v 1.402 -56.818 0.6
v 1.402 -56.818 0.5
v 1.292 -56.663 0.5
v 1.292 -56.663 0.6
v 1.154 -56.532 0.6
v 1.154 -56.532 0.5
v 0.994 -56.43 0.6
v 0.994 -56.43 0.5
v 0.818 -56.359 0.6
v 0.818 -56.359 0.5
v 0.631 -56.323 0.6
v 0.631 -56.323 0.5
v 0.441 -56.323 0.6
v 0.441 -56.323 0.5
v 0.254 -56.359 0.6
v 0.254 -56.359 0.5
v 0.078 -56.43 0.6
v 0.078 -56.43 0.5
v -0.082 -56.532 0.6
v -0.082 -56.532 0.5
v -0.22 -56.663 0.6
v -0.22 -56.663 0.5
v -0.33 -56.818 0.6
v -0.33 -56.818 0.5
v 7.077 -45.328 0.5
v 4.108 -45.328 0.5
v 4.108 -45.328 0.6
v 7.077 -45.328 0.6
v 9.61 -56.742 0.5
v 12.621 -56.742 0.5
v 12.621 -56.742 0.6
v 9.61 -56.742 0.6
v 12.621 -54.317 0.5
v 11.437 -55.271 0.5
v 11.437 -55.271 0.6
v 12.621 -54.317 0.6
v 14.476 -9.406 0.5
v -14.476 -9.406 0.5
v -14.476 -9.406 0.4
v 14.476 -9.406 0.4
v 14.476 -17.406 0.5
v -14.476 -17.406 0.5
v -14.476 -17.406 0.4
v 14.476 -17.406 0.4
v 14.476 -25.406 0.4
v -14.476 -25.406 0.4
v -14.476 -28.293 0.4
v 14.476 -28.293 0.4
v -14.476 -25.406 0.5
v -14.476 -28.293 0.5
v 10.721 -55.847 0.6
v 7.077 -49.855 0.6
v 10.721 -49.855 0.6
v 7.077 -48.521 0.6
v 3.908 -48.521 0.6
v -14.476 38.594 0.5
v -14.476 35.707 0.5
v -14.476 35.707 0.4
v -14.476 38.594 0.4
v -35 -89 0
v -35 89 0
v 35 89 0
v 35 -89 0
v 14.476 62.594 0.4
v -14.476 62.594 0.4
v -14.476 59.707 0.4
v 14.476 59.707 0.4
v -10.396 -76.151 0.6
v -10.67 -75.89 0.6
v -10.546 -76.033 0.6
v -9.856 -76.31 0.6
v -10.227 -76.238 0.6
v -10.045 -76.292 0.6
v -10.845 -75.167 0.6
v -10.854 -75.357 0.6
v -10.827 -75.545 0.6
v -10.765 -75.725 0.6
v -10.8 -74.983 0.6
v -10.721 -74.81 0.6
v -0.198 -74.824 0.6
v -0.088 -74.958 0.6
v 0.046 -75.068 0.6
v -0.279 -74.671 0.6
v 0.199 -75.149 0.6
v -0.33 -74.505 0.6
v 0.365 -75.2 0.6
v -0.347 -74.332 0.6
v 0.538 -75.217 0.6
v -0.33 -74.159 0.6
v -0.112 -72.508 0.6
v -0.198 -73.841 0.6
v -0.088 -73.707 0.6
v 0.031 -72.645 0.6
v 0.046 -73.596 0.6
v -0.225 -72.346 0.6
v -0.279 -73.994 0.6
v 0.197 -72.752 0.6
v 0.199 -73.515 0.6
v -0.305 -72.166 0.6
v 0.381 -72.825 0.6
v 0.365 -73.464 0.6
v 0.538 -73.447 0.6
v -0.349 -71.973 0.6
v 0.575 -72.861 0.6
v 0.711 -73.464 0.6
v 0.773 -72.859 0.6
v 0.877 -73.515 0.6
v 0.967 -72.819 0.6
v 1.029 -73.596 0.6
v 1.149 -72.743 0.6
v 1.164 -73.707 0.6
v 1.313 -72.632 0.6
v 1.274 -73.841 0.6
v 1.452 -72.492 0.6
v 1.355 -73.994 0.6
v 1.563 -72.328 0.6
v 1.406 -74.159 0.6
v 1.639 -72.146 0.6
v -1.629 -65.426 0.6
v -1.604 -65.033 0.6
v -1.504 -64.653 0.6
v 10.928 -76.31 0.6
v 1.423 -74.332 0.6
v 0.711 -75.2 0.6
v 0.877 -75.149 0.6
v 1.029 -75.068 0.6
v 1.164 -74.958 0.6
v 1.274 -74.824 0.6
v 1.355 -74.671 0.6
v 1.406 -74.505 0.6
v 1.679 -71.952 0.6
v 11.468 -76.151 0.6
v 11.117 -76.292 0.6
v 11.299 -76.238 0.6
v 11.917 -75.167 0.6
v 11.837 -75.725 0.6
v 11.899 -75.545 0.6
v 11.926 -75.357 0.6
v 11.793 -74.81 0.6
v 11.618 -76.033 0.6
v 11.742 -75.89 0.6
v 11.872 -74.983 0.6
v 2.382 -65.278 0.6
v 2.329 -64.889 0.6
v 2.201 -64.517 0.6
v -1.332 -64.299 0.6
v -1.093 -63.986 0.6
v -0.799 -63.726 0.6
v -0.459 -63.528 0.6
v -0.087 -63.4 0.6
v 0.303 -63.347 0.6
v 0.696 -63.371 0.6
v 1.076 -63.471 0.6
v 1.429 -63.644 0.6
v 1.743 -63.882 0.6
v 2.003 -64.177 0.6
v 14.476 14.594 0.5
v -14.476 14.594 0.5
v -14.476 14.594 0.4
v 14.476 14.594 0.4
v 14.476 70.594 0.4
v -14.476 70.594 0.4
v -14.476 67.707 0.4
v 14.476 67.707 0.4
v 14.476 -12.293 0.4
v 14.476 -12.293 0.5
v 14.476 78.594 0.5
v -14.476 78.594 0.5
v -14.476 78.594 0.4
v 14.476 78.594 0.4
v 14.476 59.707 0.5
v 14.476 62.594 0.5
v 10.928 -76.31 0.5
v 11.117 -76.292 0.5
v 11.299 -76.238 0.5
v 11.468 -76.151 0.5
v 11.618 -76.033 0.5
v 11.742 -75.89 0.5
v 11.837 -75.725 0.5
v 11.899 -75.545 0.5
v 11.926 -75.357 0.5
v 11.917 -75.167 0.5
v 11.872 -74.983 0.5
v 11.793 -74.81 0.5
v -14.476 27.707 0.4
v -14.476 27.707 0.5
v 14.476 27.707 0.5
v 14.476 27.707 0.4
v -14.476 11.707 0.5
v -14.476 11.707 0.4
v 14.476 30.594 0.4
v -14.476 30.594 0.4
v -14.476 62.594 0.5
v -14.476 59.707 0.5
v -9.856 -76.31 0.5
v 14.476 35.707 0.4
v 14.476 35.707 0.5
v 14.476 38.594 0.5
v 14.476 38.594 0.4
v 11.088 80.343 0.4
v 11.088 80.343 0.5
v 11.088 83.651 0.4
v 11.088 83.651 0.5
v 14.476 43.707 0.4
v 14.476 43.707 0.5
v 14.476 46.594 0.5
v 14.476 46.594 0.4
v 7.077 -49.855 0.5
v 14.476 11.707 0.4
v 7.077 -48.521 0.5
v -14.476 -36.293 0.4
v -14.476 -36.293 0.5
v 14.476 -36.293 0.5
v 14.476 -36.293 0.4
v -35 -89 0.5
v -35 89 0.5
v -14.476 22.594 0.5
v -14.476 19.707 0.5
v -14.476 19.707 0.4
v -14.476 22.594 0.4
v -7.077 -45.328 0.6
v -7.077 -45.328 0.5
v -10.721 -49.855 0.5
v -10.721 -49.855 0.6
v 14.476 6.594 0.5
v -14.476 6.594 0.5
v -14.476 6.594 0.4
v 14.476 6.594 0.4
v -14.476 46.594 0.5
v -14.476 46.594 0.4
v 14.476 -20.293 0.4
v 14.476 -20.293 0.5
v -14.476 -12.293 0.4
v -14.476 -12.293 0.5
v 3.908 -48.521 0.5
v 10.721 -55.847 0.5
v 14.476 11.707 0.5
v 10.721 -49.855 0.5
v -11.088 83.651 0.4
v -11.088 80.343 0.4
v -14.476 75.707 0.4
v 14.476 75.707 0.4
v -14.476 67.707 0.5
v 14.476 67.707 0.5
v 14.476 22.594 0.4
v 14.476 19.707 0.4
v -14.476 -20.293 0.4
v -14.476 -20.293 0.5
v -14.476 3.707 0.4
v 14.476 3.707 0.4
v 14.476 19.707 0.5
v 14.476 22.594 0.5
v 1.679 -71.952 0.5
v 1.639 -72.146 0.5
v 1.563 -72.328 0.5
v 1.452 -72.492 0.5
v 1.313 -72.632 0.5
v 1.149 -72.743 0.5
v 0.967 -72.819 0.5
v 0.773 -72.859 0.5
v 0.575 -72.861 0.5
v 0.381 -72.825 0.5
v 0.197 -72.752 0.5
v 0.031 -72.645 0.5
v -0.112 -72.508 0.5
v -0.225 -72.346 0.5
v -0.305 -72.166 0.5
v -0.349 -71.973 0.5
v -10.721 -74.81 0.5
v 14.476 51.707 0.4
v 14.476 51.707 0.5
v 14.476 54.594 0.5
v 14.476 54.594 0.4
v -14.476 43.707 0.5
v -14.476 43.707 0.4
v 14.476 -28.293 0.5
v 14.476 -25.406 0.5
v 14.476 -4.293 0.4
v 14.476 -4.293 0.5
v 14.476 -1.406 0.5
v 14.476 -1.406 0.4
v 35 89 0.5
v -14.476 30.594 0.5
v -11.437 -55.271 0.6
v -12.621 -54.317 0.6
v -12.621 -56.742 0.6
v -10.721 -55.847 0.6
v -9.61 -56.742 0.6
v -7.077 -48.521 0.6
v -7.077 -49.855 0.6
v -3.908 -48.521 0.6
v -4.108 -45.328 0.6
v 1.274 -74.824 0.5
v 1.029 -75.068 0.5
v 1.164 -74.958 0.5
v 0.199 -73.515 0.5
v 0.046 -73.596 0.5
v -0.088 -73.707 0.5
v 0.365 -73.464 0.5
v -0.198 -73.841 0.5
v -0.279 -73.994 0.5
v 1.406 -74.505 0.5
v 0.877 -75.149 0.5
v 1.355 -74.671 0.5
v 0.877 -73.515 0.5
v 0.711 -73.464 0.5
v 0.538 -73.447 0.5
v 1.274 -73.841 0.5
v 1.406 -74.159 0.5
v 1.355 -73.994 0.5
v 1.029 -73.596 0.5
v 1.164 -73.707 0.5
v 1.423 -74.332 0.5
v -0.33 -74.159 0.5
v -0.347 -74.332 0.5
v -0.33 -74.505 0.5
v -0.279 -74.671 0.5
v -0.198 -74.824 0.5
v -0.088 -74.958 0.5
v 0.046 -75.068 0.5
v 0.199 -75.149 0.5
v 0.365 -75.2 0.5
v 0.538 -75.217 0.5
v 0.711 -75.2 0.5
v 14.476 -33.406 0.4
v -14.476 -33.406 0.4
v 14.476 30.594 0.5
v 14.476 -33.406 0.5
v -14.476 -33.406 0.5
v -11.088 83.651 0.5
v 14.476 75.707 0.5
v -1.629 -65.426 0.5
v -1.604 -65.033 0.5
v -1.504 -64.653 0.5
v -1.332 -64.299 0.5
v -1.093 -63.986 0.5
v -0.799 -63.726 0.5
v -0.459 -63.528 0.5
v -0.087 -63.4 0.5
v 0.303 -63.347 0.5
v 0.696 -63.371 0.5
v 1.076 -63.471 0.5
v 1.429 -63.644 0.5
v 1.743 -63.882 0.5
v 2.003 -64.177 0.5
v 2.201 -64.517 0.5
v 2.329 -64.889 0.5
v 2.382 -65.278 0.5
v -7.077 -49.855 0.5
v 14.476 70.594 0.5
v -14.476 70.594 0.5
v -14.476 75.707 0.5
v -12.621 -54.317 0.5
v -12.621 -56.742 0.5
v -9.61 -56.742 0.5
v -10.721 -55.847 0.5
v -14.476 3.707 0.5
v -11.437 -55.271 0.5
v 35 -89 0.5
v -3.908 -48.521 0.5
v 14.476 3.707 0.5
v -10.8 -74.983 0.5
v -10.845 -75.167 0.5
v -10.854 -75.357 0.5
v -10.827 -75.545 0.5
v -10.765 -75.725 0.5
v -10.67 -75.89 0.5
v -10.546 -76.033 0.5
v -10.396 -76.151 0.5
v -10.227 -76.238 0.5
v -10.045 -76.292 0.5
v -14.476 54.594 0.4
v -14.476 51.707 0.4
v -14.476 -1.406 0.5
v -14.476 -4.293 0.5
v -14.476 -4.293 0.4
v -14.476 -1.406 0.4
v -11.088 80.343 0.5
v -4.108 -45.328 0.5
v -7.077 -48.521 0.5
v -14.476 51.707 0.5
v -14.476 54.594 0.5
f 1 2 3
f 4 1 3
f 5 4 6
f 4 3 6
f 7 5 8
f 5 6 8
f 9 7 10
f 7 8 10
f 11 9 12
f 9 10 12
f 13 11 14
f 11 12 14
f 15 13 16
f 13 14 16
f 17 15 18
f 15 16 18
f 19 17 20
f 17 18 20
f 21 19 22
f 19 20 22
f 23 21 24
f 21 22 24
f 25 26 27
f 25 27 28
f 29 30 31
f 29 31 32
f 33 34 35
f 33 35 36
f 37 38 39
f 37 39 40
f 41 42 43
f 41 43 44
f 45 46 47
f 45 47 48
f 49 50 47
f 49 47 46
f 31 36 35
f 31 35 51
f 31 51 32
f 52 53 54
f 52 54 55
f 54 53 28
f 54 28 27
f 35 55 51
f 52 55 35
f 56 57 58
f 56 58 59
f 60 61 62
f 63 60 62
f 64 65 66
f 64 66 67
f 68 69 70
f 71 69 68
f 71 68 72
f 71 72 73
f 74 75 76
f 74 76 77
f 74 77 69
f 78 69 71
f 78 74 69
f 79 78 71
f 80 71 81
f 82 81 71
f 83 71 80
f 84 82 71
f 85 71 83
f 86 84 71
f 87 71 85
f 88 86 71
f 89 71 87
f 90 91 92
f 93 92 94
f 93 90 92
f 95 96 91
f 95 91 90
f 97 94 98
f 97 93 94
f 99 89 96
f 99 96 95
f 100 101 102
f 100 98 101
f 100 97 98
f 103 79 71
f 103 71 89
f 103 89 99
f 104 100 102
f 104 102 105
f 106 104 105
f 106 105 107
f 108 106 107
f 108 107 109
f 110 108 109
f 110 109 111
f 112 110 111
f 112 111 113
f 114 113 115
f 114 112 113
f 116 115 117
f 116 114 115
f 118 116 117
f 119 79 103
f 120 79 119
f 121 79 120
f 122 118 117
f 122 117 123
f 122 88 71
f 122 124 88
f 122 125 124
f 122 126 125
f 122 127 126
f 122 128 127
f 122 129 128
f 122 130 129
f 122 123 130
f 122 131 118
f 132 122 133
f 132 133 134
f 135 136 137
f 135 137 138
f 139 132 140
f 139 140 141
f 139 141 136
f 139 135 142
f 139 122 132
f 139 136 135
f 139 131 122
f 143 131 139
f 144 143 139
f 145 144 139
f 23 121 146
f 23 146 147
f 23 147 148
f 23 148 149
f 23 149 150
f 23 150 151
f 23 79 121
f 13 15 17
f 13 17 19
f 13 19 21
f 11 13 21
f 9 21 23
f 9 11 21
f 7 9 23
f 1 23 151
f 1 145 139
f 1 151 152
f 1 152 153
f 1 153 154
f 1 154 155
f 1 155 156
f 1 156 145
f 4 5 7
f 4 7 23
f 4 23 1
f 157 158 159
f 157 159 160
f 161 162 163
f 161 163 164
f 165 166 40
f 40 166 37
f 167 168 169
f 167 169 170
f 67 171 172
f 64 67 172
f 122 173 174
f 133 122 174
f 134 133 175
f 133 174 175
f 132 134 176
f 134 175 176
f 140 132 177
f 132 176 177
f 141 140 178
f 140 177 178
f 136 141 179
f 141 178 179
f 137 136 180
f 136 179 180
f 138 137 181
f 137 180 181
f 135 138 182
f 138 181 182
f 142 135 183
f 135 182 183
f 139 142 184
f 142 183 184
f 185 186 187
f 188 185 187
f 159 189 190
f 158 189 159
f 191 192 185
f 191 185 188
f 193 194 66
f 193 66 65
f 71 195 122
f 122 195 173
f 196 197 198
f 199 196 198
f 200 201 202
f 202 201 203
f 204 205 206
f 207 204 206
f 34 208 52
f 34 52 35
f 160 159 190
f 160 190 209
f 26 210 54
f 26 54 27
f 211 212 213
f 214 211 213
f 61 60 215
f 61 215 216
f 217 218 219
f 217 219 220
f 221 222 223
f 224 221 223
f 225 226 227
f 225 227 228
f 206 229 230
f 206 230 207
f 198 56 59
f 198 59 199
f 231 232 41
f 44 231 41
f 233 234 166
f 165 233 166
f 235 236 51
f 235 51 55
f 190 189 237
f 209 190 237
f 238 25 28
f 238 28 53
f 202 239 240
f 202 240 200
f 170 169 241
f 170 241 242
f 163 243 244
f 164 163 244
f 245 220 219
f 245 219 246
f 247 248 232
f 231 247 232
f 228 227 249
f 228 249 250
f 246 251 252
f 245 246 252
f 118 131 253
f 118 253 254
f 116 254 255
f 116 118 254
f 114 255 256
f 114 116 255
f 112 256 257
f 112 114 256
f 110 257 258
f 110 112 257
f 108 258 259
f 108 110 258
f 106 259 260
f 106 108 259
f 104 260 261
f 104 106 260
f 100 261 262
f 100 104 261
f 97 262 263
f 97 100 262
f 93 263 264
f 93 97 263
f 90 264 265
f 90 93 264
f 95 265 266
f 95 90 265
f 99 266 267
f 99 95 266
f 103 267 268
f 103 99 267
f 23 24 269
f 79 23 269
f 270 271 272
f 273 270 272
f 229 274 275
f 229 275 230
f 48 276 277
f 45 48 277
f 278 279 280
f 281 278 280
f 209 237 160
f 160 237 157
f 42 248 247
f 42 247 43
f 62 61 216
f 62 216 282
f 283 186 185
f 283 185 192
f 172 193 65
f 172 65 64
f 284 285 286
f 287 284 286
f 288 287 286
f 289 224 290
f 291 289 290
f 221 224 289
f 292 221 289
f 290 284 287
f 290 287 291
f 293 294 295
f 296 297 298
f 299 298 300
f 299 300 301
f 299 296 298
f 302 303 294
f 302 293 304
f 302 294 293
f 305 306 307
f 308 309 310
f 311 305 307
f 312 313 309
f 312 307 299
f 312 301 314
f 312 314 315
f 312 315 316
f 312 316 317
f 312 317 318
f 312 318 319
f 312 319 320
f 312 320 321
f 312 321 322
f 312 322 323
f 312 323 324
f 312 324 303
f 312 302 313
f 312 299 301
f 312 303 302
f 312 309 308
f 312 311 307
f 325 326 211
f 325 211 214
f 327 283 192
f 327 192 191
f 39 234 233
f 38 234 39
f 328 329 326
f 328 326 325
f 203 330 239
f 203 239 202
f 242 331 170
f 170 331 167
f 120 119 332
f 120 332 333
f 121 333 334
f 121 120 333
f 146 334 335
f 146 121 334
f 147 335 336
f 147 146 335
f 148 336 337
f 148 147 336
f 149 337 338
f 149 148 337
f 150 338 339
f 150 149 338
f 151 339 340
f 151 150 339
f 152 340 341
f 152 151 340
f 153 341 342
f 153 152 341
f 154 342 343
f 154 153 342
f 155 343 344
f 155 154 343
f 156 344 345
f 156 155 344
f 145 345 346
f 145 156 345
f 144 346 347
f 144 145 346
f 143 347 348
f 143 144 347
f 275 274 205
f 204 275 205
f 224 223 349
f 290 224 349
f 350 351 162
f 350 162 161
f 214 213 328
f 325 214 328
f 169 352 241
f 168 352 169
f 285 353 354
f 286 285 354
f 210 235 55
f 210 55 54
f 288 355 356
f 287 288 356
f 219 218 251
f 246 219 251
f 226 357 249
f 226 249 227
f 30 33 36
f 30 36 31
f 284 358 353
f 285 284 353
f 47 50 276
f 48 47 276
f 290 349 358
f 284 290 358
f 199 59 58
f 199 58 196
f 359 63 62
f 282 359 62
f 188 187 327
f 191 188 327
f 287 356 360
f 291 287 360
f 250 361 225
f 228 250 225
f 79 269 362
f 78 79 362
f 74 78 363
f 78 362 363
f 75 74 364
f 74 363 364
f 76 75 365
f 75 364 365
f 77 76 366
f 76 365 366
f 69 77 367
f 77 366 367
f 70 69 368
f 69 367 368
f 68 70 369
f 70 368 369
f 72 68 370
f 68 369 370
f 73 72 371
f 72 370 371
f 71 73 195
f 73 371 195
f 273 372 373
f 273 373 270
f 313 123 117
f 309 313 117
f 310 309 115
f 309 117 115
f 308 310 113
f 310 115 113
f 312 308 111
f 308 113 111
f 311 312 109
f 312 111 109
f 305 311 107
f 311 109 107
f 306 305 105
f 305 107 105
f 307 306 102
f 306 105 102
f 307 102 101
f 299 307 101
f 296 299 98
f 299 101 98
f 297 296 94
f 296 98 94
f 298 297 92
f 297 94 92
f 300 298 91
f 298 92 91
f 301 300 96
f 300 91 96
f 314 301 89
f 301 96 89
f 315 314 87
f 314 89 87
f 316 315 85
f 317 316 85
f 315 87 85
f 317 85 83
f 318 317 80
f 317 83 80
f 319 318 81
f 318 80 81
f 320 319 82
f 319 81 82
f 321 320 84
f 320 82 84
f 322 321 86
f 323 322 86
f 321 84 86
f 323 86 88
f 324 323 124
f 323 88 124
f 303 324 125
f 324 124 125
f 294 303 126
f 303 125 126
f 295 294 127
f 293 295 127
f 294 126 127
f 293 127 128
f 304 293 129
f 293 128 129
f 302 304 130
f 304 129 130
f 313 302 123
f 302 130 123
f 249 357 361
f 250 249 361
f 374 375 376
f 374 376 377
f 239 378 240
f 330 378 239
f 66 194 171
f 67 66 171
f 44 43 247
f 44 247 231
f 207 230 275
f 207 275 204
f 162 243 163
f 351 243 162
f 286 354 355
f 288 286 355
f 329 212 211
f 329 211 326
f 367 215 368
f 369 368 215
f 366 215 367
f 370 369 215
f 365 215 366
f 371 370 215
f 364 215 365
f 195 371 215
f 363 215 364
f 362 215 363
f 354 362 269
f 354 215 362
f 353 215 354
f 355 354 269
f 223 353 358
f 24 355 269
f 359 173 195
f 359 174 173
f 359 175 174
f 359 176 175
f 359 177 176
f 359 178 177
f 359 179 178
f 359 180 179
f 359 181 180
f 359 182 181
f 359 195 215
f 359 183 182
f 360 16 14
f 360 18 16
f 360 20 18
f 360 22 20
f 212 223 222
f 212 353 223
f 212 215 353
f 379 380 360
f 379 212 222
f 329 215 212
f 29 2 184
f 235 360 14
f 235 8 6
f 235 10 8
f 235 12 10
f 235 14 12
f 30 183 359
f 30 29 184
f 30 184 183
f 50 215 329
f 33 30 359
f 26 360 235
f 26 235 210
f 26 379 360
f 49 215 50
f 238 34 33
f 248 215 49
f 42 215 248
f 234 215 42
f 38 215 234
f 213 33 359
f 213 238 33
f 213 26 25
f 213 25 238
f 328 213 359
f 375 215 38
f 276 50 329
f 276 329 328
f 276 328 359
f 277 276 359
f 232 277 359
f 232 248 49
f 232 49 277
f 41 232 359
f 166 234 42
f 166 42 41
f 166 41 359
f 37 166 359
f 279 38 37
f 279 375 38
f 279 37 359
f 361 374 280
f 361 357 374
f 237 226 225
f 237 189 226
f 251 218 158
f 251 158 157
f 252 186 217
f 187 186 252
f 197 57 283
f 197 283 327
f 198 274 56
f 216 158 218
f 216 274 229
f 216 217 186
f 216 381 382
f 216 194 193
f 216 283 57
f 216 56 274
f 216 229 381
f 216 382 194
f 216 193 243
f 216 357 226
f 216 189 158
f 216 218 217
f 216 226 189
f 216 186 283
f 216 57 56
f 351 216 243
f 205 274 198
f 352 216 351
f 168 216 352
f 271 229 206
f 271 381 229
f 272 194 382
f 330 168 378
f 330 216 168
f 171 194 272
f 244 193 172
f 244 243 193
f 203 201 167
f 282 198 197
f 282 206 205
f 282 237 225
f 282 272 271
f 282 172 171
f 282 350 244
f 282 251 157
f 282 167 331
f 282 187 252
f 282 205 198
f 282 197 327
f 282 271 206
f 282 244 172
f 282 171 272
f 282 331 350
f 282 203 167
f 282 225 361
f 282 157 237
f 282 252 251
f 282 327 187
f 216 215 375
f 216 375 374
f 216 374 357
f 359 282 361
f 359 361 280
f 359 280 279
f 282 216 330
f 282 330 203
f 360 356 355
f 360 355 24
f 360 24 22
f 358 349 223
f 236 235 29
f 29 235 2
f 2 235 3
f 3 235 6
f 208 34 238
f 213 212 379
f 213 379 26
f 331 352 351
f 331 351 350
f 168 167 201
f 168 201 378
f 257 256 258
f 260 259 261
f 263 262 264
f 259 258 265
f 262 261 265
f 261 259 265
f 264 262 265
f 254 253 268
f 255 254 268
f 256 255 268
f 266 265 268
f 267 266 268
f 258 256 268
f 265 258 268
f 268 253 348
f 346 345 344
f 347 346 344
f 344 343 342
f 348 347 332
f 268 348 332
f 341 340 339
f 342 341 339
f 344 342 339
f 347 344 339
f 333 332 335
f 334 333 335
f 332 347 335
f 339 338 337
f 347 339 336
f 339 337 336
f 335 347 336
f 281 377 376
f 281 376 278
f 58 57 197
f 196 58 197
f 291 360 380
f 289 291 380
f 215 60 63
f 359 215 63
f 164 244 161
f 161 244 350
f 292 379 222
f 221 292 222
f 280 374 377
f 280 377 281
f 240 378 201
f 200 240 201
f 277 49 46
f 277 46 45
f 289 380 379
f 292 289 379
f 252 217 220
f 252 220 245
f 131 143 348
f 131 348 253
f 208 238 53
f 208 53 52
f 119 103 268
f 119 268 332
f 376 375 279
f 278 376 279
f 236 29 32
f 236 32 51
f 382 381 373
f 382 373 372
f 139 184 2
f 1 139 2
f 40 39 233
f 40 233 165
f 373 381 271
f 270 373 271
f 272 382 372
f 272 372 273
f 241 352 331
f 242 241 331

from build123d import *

# Parameters (mm, degrees)
CROQUIS2_W              = 70
CROQUIS2_H              = 178
SALIENTE_EXTRUIR1_DEPTH = 0.5
SALIENTE_EXTRUIR3_DEPTH = 0.1
CROQUIS7_W              = 22.17688196
CROQUIS7_H              = 3.307809841
CORTAR_EXTRUIR1_DEPTH   = 0.1
CROQUIS12_R             = 0.884703758
CORTAR_EXTRUIR6_DEPTH   = 0.1
SALIENTE_EXTRUIR7_DEPTH = 0.1
CROQUIS14_W             = 28.951405582
CROQUIS14_H             = 2.886934834
CORTAR_EXTRUIR9_DEPTH   = 0.1


with BuildPart() as part:
    # Croquis2 → Saliente-Extruir1 (new body)
    with BuildSketch(Plane.XY):
        Rectangle(CROQUIS2_W, CROQUIS2_H)
    extrude(amount=SALIENTE_EXTRUIR1_DEPTH)

    # Croquis3 → Saliente-Extruir3 (add)
    with BuildSketch(Plane.XY.offset(0.5)):
        with BuildLine():
            Line((-9.855540385, -76.309745211), (10.927527897, -76.309745211))
            ThreePointArc((10.927527897, -76.309745211), (11.793597531, -75.809668594), (11.79346482, -74.809591989))
            Line((11.79346482, -74.809591989), (1.401930679, -56.818279148))
            ThreePointArc((1.401930679, -56.818279148), (0.535993756, -56.31843237), (-0.329943167, -56.818279148))
            Line((-0.329943167, -56.818279148), (-10.721477308, -74.809591989))
            ThreePointArc((-10.721477308, -74.809591989), (-10.721610019, -75.809668594), (-9.855540385, -76.309745211))
        make_face()
    extrude(amount=SALIENTE_EXTRUIR3_DEPTH)

    # Croquis7 → Cortar-Extruir1 (cut)
    with BuildSketch(Plane.XY.offset(0.5)):
        with Locations((0, 81.996928937)):
            Rectangle(CROQUIS7_W, CROQUIS7_H)
    extrude(amount=-CORTAR_EXTRUIR1_DEPTH, mode=Mode.SUBTRACT)

    # Croquis12 → Cortar-Extruir6 (cut)
    with BuildSketch(Plane.XY.offset(0.6)):
        with Locations((0.537972258, -74.332087137)):
            Circle(CROQUIS12_R)
        with BuildLine():
            Line((-0.348710002, -71.972665126), (-1.628640607, -65.425857317))
            ThreePointArc((-1.628640607, -65.425857317), (0.302962598, -63.346803486), (2.382016429, -65.278406691))
            Line((2.382016429, -65.278406691), (1.678502804, -71.951849763))
            ThreePointArc((1.678502804, -71.951849763), (0.674168301, -72.865249783), (-0.348710002, -71.972665126))
        make_face()
    extrude(amount=-CORTAR_EXTRUIR6_DEPTH, mode=Mode.SUBTRACT)

    # Croquis4 → Saliente-Extruir7 (add)
    with BuildSketch(Plane.XY.offset(0.5)):
        Polygon((-4.107800338, -45.327798296), (-7.077418664, -45.327798296), (-10.721484373, -49.854681807), (-7.077418664, -49.854681807), (-11.437215381, -55.270690584), (-12.621463736, -54.317390413), (-12.621463736, -56.74183704), (-9.609666384, -56.74183704), (-10.721484373, -55.846842105), (-3.908016847, -48.520813848), (-7.077418664, -48.520813848), align=None)
        Polygon((9.609666384, -56.74183704), (10.721484373, -55.846842105), (3.908016847, -48.520813848), (7.077418664, -48.520813848), (4.107800338, -45.327798296), (7.077418664, -45.327798296), (10.721484373, -49.854681807), (7.077418664, -49.854681807), (11.437215381, -55.270690584), (12.621463736, -54.317390413), (12.621463736, -56.74183704), align=None)
    extrude(amount=SALIENTE_EXTRUIR7_DEPTH)

    # Croquis14 → Cortar-Extruir9 (cut)
    with BuildSketch(Plane.XY.offset(0.5)):
        with Locations((0, 77.150486091)):
            Rectangle(CROQUIS14_W, CROQUIS14_H)
        with Locations((0, 69.150486091)):
            Rectangle(CROQUIS14_W, CROQUIS14_H)
        with Locations((0, 61.150486091)):
            Rectangle(CROQUIS14_W, CROQUIS14_H)
        with Locations((0, 53.150486091)):
            Rectangle(CROQUIS14_W, CROQUIS14_H)
        with Locations((0, 45.150486091)):
            Rectangle(CROQUIS14_W, CROQUIS14_H)
        with Locations((0, 37.150486091)):
            Rectangle(CROQUIS14_W, CROQUIS14_H)
        with Locations((0, 29.150486091)):
            Rectangle(CROQUIS14_W, CROQUIS14_H)
        with Locations((0, 21.150486091)):
            Rectangle(CROQUIS14_W, CROQUIS14_H)
        with Locations((0, 13.150486091)):
            Rectangle(CROQUIS14_W, CROQUIS14_H)
        with Locations((0, 5.150486091)):
            Rectangle(CROQUIS14_W, CROQUIS14_H)
        with Locations((0, -2.849513909)):
            Rectangle(CROQUIS14_W, CROQUIS14_H)
        with Locations((0, -10.849513909)):
            Rectangle(CROQUIS14_W, CROQUIS14_H)
        with Locations((0, -18.849513909)):
            Rectangle(CROQUIS14_W, CROQUIS14_H)
        with Locations((0, -26.849513909)):
            Rectangle(CROQUIS14_W, CROQUIS14_H)
        with Locations((0, -34.849513909)):
            Rectangle(CROQUIS14_W, CROQUIS14_H)
    extrude(amount=-CORTAR_EXTRUIR9_DEPTH, mode=Mode.SUBTRACT)


solid = part.part
